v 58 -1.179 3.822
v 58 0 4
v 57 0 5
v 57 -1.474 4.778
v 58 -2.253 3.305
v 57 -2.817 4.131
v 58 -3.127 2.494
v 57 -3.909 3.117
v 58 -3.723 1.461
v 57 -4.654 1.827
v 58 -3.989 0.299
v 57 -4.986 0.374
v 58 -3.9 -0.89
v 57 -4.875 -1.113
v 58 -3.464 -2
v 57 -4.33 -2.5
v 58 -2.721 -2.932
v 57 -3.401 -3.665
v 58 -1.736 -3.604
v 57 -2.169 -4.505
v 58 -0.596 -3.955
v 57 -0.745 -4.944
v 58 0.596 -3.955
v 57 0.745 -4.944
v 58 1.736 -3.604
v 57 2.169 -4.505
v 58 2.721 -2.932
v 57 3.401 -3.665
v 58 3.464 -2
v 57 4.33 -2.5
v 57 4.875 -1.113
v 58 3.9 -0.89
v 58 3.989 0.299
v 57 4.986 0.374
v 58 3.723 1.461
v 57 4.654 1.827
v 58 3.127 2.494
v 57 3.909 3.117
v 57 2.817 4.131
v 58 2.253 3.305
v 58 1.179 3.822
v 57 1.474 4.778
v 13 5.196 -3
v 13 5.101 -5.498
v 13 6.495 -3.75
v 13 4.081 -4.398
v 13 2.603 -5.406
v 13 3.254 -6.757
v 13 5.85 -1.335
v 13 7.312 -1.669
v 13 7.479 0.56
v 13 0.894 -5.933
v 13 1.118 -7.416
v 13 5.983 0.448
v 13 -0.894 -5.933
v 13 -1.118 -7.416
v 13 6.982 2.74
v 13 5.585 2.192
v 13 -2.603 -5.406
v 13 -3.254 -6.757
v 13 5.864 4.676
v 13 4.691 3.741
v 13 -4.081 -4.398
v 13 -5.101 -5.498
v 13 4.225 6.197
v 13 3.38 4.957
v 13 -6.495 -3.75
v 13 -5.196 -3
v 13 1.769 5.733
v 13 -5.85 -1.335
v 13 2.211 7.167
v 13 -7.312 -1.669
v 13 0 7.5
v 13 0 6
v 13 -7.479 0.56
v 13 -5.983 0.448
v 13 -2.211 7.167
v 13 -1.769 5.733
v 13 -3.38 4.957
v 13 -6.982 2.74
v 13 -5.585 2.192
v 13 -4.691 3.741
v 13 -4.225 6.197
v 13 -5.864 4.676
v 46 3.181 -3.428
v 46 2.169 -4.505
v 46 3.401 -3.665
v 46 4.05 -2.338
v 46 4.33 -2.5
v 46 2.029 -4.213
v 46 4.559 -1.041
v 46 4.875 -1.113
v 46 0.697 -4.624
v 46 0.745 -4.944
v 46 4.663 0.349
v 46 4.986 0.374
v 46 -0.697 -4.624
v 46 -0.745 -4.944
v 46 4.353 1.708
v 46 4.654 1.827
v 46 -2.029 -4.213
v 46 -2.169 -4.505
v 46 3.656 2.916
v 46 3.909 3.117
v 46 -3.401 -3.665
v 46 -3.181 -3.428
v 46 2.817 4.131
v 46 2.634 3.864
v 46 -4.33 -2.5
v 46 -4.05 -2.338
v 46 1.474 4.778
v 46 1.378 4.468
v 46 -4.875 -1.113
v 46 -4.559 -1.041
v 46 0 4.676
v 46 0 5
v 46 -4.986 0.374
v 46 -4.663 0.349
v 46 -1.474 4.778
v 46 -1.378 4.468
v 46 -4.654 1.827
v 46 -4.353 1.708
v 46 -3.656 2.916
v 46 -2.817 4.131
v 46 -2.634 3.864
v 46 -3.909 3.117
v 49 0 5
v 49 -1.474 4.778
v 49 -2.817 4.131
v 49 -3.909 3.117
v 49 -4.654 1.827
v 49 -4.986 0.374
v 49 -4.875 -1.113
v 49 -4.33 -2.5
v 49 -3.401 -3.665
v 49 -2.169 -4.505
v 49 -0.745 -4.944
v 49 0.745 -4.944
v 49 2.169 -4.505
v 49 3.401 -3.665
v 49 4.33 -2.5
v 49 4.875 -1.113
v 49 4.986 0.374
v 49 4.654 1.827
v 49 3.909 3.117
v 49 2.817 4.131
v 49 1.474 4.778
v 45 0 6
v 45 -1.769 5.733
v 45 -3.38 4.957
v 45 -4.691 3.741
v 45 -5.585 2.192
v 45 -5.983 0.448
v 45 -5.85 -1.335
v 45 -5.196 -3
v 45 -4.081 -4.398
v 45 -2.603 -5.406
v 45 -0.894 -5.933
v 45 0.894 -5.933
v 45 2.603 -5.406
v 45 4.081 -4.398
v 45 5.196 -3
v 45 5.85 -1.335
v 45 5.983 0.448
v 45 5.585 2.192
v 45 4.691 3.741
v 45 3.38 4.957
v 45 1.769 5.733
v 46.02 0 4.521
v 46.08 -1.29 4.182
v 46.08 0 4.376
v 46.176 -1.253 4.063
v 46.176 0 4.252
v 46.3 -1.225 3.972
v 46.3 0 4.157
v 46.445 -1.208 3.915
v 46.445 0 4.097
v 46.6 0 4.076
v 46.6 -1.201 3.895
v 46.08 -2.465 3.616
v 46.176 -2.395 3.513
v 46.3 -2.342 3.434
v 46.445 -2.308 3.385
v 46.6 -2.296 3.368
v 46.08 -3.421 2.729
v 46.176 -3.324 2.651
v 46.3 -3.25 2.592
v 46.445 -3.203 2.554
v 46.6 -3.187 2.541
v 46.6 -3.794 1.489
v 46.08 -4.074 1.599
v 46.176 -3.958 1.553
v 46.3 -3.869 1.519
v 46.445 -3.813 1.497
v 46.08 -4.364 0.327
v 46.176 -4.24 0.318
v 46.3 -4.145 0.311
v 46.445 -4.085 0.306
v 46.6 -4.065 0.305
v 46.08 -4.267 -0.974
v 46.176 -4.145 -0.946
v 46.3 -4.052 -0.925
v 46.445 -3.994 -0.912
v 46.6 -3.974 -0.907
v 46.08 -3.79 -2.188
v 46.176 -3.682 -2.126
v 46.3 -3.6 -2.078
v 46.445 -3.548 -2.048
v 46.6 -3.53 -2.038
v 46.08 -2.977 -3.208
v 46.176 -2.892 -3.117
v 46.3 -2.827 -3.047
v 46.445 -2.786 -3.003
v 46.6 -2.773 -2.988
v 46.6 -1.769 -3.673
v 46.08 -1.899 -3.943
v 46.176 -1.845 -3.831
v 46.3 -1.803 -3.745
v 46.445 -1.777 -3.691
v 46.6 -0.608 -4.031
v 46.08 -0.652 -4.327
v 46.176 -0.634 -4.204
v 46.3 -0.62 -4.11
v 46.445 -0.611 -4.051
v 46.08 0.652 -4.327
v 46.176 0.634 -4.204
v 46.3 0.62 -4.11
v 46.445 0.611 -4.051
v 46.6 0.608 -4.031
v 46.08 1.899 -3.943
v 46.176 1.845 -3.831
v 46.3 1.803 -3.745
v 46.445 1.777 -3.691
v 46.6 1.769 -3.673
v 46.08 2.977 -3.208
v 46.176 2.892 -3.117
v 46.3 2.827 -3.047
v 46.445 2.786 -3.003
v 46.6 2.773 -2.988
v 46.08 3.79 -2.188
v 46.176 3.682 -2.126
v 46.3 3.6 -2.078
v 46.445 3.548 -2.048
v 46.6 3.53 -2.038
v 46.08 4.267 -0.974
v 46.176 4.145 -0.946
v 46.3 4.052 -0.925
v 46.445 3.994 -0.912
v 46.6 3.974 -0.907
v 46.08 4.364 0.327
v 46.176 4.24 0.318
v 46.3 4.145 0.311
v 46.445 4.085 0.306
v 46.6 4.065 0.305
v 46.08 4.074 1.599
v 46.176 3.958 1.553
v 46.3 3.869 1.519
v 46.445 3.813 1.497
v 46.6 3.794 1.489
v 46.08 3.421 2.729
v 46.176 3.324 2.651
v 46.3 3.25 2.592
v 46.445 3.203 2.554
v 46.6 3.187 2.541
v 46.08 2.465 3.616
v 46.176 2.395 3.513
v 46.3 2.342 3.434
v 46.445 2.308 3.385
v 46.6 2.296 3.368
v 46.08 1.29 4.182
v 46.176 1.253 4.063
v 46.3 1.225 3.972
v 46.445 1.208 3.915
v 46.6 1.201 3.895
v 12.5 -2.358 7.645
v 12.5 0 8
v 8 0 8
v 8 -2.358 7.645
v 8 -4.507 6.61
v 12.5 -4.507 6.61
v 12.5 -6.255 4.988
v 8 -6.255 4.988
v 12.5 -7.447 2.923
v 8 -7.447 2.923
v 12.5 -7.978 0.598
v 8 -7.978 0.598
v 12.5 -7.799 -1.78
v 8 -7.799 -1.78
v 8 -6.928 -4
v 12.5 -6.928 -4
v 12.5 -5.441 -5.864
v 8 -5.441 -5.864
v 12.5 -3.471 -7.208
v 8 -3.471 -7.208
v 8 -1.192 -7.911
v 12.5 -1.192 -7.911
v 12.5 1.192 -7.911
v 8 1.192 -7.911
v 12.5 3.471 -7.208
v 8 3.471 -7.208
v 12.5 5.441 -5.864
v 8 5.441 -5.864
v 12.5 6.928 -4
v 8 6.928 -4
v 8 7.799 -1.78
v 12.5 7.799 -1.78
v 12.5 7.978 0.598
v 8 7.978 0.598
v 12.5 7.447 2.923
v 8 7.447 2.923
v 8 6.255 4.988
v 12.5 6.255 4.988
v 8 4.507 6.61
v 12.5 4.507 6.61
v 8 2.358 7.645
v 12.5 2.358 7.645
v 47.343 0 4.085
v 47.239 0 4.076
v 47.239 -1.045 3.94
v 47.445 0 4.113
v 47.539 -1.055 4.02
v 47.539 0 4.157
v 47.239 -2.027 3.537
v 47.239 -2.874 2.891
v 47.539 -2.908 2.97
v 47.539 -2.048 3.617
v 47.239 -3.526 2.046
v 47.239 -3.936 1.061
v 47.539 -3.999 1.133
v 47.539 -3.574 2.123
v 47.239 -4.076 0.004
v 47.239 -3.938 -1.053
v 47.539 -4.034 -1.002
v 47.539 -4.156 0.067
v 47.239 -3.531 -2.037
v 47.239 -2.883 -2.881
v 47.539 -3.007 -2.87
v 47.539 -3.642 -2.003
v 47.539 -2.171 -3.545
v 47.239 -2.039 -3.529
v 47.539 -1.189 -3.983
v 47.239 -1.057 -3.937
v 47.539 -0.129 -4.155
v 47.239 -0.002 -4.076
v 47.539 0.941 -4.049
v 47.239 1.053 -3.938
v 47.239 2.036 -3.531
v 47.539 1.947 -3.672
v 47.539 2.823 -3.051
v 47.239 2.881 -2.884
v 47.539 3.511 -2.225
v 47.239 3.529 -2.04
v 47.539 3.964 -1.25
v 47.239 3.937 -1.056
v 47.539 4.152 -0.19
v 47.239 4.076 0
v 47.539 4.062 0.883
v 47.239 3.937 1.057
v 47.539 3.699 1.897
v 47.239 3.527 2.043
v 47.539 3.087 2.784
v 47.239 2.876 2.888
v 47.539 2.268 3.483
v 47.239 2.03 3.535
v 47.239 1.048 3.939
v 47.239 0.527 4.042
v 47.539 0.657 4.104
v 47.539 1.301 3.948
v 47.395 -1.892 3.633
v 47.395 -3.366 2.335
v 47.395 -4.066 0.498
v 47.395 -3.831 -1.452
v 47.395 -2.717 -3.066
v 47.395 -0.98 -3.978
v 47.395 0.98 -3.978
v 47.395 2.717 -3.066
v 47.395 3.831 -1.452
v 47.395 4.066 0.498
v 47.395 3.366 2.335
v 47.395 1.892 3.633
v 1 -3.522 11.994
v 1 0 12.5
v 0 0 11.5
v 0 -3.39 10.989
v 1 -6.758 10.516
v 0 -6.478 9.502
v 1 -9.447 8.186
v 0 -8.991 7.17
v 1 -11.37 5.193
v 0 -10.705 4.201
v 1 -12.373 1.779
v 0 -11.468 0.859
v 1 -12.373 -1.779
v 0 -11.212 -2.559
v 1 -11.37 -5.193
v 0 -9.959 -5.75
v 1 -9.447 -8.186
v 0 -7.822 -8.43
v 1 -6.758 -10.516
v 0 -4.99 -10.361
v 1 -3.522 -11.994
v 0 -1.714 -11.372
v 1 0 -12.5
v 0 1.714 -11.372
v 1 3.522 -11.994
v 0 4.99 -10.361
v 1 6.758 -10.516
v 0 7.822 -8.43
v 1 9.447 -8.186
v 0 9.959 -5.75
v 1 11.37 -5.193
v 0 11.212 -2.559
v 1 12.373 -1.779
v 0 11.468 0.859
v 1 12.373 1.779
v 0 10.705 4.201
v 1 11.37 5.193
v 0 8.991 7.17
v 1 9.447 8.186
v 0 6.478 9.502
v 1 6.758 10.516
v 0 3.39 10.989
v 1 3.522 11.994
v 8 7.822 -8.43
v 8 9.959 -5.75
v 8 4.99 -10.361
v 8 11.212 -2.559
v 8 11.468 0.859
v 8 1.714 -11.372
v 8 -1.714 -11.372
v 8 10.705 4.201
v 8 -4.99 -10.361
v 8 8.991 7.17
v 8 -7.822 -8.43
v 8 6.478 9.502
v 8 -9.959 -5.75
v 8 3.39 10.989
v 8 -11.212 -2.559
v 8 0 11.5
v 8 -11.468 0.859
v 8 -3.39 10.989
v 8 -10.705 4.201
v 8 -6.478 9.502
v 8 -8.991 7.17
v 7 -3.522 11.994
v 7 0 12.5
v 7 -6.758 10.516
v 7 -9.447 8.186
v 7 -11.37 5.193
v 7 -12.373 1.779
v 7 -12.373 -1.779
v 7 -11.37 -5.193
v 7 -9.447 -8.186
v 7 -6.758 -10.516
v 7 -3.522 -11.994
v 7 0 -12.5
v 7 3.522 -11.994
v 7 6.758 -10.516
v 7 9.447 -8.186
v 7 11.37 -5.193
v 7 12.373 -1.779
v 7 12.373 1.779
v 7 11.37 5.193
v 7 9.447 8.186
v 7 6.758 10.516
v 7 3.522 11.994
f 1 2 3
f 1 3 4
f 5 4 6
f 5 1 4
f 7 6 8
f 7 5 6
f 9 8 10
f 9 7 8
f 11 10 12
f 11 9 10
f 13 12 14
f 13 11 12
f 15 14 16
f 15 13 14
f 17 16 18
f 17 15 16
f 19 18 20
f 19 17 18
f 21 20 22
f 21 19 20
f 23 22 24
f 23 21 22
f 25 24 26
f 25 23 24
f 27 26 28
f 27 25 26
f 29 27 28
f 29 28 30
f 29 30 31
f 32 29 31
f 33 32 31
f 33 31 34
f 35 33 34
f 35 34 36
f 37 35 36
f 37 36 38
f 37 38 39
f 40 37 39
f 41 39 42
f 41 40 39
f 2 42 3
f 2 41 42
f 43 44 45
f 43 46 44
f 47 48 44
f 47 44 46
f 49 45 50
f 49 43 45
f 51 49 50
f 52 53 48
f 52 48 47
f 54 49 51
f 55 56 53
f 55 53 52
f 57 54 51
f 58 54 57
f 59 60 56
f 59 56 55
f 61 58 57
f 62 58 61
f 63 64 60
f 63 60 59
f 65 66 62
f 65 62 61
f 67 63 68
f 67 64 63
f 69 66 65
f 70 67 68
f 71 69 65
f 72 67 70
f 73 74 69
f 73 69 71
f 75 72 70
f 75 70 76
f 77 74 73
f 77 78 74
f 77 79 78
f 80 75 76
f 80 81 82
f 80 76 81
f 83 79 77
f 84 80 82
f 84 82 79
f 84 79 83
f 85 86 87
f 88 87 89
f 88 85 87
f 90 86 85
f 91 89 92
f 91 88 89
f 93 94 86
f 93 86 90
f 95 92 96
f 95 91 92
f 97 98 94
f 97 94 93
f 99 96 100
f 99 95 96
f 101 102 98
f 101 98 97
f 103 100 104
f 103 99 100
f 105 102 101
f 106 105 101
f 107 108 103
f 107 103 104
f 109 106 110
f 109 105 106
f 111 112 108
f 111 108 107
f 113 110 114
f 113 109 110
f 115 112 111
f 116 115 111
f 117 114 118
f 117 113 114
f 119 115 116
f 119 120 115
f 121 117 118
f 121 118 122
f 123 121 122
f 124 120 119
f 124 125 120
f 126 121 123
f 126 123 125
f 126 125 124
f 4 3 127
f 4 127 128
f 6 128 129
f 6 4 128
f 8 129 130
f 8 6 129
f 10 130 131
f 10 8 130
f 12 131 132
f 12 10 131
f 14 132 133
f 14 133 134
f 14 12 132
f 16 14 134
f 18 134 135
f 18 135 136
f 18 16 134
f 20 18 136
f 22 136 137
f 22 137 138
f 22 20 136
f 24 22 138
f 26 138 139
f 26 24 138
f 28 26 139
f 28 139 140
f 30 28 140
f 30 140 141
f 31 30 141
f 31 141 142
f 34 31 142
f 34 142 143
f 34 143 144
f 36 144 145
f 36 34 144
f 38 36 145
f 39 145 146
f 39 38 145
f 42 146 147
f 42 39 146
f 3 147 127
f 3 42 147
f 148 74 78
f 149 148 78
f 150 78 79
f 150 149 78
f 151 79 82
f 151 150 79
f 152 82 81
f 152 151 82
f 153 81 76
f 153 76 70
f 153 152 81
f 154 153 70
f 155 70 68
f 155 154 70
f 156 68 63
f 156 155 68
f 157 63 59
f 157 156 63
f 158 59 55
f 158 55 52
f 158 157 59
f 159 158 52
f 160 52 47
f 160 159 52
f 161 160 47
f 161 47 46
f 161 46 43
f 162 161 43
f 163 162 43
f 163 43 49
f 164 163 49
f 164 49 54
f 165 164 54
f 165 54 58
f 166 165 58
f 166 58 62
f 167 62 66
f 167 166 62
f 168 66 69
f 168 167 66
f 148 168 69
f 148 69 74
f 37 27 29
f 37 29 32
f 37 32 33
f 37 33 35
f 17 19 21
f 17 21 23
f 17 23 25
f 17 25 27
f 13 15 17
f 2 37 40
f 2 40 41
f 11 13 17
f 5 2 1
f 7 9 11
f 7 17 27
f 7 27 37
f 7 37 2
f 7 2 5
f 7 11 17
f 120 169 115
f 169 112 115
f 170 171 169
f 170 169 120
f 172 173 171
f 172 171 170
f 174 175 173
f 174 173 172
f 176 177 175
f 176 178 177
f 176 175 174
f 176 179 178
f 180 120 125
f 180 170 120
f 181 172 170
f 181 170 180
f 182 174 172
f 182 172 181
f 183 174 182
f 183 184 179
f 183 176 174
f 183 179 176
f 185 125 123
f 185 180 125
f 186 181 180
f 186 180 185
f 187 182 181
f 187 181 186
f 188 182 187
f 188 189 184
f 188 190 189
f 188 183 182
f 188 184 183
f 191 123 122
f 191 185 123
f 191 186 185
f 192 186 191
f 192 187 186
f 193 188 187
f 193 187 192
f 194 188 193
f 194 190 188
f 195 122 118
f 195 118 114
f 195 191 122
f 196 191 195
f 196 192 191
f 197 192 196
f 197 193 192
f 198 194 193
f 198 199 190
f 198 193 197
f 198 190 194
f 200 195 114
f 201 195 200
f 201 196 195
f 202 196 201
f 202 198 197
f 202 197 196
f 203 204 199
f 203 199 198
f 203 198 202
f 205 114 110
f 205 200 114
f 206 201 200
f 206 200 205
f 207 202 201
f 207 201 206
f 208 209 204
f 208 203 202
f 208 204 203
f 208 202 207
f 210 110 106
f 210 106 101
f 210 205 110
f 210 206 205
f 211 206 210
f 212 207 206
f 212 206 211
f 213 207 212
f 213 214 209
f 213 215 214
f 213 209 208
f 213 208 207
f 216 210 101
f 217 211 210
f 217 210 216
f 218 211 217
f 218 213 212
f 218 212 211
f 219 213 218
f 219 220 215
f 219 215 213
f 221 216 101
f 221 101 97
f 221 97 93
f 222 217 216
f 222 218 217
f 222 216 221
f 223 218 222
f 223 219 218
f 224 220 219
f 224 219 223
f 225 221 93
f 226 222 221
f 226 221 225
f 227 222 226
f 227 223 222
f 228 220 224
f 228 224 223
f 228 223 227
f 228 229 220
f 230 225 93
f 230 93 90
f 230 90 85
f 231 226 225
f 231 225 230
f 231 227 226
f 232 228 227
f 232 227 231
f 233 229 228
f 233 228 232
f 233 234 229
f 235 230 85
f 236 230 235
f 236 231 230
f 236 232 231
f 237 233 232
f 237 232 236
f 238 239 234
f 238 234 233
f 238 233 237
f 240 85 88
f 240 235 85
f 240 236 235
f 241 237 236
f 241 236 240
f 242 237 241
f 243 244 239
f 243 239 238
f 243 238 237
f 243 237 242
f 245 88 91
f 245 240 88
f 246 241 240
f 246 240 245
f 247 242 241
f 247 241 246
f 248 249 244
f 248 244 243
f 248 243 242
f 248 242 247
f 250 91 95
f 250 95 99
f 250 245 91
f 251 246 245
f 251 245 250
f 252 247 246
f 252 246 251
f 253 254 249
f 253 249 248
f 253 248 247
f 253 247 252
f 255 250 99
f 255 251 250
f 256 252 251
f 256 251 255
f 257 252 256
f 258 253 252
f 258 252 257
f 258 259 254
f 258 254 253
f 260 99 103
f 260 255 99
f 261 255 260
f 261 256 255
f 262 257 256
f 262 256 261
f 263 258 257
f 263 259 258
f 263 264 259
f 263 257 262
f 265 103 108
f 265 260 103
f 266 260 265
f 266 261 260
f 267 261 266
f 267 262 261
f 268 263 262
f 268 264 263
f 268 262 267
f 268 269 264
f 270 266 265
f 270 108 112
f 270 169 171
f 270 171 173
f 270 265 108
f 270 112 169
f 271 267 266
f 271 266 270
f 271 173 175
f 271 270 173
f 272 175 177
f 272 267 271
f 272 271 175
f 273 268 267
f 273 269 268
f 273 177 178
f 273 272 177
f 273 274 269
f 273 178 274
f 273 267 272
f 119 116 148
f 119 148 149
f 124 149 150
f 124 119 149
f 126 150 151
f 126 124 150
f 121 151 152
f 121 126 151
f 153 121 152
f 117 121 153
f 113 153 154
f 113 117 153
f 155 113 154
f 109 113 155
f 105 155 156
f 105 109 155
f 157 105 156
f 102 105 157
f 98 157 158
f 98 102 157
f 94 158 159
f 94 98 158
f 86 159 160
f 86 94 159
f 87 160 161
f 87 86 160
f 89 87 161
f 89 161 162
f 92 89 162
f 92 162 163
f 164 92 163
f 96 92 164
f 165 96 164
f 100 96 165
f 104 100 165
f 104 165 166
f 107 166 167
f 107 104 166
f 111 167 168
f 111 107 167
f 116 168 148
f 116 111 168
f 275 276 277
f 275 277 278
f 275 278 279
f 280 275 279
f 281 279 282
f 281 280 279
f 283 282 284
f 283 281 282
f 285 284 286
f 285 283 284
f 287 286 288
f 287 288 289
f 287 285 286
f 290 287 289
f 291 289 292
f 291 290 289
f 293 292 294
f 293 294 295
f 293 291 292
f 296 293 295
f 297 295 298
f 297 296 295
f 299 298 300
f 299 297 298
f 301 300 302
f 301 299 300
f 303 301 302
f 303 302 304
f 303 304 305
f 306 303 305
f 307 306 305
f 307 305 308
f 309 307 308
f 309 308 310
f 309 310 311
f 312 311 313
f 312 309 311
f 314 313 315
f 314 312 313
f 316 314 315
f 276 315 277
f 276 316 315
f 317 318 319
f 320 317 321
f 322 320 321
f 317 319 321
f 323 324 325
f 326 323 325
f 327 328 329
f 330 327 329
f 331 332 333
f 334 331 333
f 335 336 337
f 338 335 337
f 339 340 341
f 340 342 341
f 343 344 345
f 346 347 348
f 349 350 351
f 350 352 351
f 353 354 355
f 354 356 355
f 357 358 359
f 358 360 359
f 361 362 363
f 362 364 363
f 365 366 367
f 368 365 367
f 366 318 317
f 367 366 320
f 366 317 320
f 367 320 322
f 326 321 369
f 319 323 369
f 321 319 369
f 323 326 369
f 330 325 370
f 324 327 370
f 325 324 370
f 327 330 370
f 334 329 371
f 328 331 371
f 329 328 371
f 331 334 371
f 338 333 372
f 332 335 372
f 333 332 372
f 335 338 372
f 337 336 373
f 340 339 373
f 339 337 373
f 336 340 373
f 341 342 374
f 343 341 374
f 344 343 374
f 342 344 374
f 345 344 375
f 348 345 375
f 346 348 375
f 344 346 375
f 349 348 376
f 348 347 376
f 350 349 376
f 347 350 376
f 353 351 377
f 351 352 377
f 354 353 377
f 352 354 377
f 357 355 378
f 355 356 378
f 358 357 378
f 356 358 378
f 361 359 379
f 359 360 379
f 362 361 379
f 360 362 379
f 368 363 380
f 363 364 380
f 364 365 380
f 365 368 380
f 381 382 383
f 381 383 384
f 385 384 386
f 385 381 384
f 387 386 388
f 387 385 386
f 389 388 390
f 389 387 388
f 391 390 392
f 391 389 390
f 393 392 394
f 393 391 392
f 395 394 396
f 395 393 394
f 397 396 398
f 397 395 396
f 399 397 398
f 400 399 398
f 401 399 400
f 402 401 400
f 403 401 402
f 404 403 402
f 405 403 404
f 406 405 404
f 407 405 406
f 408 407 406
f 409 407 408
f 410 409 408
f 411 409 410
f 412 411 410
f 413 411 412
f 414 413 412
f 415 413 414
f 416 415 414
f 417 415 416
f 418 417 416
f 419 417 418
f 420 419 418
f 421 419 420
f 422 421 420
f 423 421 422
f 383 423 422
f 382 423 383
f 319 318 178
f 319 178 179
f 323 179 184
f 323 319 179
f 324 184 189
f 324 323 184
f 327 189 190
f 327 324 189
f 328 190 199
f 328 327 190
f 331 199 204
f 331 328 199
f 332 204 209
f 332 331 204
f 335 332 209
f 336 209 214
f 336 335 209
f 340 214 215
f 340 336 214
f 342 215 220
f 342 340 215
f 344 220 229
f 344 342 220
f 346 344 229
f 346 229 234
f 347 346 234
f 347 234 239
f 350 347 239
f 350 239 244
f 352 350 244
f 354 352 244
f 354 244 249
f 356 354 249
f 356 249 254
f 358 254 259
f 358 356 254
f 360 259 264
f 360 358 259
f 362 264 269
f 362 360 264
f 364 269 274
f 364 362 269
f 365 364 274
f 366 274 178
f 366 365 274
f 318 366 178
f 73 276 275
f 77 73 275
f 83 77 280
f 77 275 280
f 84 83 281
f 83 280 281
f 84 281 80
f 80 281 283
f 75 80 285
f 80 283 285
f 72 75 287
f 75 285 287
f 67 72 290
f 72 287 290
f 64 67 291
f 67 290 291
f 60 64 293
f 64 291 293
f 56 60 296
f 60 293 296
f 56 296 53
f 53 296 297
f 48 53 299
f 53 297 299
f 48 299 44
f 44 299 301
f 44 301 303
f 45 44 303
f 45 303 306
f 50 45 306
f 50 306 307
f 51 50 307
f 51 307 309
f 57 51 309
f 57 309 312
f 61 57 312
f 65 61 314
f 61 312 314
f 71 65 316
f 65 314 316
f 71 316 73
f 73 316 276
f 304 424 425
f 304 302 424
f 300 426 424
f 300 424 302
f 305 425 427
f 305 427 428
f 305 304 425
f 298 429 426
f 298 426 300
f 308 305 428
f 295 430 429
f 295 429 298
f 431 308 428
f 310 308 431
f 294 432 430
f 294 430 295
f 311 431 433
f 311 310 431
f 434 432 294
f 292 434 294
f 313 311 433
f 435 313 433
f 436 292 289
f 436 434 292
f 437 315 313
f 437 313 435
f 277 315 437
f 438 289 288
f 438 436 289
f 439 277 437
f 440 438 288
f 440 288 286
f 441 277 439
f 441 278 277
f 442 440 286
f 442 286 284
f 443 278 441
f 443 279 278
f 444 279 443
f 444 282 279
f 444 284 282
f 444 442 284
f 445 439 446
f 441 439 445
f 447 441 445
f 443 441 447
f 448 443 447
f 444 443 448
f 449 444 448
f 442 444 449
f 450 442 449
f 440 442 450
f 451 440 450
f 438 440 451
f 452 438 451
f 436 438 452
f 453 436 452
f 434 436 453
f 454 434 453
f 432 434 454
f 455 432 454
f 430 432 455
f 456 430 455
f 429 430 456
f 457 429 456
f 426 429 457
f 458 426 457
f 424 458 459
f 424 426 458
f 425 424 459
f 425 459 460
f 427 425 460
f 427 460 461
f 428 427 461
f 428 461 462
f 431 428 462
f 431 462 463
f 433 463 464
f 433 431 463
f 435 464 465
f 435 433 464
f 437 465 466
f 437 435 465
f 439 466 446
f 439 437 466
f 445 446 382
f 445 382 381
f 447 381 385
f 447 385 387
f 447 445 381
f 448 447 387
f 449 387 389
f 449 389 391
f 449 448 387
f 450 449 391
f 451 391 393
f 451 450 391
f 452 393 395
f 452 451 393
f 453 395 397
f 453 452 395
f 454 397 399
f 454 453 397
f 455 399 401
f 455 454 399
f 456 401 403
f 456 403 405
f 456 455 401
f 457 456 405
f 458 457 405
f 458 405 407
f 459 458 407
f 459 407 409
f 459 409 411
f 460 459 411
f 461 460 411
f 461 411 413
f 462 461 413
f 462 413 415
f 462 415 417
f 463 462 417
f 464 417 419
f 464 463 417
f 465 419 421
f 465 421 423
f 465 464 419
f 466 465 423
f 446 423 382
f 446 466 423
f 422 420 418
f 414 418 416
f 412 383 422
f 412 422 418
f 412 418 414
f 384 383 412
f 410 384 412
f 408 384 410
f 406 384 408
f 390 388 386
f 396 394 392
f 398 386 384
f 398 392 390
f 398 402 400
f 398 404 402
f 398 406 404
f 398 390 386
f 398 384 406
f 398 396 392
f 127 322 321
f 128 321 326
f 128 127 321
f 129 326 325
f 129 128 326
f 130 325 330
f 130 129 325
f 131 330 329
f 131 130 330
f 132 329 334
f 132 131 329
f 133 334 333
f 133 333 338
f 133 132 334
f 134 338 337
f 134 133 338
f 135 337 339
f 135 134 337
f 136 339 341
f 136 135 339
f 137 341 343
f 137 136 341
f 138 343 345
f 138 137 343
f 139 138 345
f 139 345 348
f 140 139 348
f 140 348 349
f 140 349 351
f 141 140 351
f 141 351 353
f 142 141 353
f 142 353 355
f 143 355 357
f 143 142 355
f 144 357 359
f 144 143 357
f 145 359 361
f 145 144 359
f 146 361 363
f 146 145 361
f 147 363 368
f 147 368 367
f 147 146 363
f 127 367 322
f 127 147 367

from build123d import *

# Parameters (mm, degrees)
CHAMFER1_SIZE = 1
FILLET1_R     = 0.6
CHAMFER3_SIZE = 1
CHAMFER4_SIZE = 0.5


with BuildPart() as part:
    # Sketch1 → Revolve1 (revolve)
    with BuildSketch(Plane.XY, mode=Mode.PRIVATE) as revolve1_sk:
        Polygon((0, 0), (0, 12.5), (8, 12.5), (8, 8), (13, 8), (13, 6), (46, 6), (46, 4.076239569), (47.4, 4.076239569), (49, 5), (58, 5), (58, 0), align=None)
    revolve(revolve1_sk.sketch.rotate(Axis((-9.676136096, 0, 0), (1, 0, 0)), 90), axis=Axis((-9.676136096, 0, 0), (1, 0, 0)))

    # Chamfer1
    chamfer1_edges = [part.edges().sort_by_distance(p)[0] for p in [
        (46, 0, -6),
        (8, 0, -12.5),
        (0, 0, -12.5),
    ]]
    chamfer(chamfer1_edges, length=CHAMFER1_SIZE)

    # Fillet1
    fillet1_edges = [part.edges().sort_by_distance(p)[0] for p in [
        (47.4, 0, -4.076239569),
        (46, 0, -4.076239569),
    ]]
    fillet(fillet1_edges, radius=FILLET1_R)

    # Chamfer3
    chamfer3_edges = [part.edges().sort_by_distance(p)[0] for p in [
        (58, 0, -5),
    ]]
    chamfer(chamfer3_edges, length=CHAMFER3_SIZE)

    # Chamfer4
    chamfer4_edges = [part.edges().sort_by_distance(p)[0] for p in [
        (13, 0, -8),
    ]]
    chamfer(chamfer4_edges, length=CHAMFER4_SIZE)


solid = part.part
